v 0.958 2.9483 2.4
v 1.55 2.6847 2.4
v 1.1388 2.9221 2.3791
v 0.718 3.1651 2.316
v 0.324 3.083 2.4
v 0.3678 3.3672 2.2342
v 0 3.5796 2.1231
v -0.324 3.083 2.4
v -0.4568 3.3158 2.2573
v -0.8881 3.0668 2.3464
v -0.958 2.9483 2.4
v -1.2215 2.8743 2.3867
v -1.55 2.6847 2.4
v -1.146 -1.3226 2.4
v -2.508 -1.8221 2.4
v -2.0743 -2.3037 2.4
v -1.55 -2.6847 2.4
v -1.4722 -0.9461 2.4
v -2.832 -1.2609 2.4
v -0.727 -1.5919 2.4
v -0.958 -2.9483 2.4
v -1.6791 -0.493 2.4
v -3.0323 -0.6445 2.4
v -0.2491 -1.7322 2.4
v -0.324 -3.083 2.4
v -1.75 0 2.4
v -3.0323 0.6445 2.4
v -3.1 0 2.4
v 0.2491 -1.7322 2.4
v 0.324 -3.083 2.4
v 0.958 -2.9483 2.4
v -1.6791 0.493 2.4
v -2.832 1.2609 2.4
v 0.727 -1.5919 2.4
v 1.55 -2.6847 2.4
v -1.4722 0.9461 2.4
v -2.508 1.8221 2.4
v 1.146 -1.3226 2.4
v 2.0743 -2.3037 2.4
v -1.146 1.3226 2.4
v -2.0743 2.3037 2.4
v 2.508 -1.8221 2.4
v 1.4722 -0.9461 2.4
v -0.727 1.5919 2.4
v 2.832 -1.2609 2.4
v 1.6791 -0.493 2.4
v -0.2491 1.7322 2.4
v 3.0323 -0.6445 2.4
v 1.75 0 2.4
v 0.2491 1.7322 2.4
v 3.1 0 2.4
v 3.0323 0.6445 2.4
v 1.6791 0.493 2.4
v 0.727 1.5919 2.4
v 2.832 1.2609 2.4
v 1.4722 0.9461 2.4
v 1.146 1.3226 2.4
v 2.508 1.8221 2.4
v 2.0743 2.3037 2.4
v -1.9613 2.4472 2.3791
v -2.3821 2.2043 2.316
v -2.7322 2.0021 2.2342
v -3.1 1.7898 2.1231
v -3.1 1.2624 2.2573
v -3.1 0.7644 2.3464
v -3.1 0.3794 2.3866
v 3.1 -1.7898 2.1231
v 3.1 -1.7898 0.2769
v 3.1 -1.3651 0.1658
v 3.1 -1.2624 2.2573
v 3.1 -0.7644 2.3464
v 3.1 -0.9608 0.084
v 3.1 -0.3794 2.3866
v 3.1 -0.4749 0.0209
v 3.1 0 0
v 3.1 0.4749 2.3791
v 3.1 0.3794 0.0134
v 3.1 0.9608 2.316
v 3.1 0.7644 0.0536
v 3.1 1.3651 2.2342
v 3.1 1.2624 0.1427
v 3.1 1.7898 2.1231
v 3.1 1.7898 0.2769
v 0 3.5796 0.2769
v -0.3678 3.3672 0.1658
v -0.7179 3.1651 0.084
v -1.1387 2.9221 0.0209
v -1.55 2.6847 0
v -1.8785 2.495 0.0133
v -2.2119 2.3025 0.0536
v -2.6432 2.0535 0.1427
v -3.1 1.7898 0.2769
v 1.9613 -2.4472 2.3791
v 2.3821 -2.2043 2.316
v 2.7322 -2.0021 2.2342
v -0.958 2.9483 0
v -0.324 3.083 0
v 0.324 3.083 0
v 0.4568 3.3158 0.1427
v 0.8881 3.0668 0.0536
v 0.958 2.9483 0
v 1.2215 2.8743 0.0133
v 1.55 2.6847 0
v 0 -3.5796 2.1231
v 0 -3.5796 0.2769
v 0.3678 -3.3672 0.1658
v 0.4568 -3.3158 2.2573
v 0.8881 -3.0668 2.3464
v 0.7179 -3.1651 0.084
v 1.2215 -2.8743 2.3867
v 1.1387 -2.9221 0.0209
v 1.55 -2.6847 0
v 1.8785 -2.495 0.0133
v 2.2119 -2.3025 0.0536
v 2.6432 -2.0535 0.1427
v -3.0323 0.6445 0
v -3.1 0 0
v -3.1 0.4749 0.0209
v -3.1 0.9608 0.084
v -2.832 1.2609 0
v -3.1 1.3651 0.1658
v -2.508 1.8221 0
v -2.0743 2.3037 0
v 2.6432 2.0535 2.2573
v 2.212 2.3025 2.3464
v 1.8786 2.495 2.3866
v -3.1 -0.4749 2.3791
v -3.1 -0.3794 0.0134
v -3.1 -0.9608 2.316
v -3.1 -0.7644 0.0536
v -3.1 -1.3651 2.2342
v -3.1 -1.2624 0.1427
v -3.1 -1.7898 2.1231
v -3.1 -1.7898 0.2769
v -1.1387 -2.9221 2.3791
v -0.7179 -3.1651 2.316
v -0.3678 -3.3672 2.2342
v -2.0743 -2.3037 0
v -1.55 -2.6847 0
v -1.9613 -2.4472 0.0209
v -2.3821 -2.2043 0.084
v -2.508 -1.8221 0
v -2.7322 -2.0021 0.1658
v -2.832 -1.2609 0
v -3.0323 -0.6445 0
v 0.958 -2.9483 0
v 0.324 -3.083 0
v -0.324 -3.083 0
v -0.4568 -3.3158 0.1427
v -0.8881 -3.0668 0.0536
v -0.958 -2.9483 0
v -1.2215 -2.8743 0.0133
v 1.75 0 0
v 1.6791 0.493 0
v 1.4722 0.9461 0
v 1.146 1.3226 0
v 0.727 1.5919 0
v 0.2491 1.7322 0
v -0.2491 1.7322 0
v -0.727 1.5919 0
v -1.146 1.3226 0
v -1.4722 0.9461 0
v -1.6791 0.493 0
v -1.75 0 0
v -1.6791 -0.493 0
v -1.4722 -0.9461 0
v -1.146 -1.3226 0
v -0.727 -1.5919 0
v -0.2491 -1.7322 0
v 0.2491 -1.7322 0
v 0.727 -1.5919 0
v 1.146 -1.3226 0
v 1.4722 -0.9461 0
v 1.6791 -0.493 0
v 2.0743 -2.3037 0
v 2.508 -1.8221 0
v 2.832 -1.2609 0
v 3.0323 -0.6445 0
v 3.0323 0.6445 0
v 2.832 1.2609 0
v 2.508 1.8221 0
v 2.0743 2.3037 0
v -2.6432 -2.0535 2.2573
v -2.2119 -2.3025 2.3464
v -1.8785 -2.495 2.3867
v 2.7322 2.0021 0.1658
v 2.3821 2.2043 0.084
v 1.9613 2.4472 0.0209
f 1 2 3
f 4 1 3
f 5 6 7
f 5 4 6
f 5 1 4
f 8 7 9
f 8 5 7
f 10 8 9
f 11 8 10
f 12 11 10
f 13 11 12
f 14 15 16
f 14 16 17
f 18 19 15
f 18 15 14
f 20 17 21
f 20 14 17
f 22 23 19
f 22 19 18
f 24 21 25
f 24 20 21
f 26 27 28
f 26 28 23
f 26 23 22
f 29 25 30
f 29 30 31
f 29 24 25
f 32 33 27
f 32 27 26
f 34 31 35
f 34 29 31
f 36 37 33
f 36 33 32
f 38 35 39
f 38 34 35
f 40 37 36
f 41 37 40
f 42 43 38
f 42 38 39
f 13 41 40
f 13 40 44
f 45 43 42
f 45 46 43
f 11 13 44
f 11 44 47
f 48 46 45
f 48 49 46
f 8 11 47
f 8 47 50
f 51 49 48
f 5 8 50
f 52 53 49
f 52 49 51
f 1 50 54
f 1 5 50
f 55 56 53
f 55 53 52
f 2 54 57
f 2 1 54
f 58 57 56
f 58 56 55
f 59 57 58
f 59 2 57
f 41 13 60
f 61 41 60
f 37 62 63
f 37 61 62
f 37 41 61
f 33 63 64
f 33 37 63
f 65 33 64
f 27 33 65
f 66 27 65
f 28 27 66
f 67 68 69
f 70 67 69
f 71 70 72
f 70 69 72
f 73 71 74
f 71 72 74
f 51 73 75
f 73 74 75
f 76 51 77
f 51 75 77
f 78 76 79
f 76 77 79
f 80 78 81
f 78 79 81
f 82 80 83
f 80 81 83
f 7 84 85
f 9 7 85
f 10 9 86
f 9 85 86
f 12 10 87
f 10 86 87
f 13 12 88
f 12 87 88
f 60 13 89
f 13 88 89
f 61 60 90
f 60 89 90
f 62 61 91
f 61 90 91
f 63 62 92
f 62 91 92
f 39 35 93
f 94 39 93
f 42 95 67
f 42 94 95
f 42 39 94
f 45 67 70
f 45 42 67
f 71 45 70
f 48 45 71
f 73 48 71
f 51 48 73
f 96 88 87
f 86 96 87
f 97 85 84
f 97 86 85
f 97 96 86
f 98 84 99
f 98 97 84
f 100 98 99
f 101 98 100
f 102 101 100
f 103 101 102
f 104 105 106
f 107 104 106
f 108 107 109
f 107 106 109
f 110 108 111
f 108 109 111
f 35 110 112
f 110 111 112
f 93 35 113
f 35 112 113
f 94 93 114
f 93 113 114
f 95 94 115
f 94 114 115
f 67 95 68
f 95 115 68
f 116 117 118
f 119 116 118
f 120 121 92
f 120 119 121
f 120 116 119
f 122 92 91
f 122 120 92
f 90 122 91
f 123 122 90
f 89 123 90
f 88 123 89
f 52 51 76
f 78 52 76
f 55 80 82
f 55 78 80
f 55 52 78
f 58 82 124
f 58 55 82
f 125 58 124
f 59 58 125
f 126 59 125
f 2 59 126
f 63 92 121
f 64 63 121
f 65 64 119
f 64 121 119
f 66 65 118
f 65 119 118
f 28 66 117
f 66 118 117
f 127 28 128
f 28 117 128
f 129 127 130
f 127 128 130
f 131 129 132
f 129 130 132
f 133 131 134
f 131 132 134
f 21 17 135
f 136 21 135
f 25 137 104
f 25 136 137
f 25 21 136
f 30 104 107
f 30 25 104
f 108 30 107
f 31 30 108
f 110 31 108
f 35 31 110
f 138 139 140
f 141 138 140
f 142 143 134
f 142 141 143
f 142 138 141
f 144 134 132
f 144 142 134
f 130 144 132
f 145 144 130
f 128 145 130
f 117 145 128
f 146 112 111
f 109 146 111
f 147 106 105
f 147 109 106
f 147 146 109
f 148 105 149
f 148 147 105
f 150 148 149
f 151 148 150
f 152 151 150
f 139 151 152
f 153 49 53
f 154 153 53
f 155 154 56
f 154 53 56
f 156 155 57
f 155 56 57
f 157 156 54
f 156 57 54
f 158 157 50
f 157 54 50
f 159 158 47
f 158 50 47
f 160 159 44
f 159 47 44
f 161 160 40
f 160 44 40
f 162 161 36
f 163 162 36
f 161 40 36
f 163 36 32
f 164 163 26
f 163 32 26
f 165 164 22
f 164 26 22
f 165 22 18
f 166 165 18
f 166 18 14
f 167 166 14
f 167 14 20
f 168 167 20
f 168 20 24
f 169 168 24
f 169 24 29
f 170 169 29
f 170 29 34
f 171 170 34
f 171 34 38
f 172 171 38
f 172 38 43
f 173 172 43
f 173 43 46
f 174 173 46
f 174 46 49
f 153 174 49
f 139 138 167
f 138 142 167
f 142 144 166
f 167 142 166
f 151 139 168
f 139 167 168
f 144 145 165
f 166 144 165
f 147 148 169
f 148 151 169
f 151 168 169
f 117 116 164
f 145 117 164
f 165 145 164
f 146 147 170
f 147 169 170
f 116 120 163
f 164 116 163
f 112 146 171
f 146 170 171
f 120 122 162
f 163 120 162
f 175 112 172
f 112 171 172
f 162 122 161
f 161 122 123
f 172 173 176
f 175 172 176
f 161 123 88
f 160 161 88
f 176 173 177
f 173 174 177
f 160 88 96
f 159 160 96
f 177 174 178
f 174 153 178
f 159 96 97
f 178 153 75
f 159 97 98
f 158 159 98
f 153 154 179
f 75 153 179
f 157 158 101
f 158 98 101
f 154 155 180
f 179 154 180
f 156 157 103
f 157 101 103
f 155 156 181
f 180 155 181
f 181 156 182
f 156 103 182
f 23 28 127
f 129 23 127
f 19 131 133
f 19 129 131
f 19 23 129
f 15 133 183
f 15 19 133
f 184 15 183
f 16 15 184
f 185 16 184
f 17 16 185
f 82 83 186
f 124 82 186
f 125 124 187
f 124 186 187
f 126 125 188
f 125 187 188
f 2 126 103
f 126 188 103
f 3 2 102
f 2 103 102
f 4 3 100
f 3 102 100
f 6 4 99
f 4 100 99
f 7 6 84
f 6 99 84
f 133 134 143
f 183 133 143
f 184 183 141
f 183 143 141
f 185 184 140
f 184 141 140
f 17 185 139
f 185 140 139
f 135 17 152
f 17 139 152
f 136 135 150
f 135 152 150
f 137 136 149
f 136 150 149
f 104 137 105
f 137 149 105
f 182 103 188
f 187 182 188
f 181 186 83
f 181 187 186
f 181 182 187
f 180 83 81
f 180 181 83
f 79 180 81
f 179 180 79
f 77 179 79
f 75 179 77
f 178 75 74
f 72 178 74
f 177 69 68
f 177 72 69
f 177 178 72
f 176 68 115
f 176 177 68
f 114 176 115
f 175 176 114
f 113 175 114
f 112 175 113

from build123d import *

# Parameters (mm, degrees)
EXTRUDE_1_DEPTH          = 2.4
SKETCH_2_OUTSIDE_W       = 15.35
SKETCH_2_OUTSIDE_H       = 16.31
SKETCH_2_OUTSIDE_R       = 3.1
CUT_EXTRUDE_2_DEPTH      = 1.5
CUT_EXTRUDE_2_DRAFT      = -60
MIRROR_1_COPY_1_SKETCH_W = 15.35
MIRROR_1_COPY_1_SKETCH_H = 16.31
MIRROR_1_COPY_1_SKETCH_R = 3.1
MIRROR_1_COPY_1_DEPTH    = 1.5
MIRROR_1_COPY_1_DRAFT    = -60
SKETCH_3_R               = 1.75
CUT_EXTRUDE_3_DEPTH      = 6.30879773


with BuildPart() as part:
    # 草圖1 → 伸長1 (new body)
    with BuildSketch(Plane.XY):
        Polygon((0, 3.579571669), (-3.1, 1.789785834), (-3.1, -1.789785834), (0, -3.579571669), (3.1, -1.789785834), (3.1, 1.789785834), align=None)
    extrude(amount=EXTRUDE_1_DEPTH)


with BuildPart() as cut_extrude_2_tool:
    # 草圖2 outside → 伸長2 (with draft: the straight prism first)
    with BuildSketch(Plane.XY.offset(2.4)):
        Rectangle(SKETCH_2_OUTSIDE_W, SKETCH_2_OUTSIDE_H)
        Circle(SKETCH_2_OUTSIDE_R, mode=Mode.SUBTRACT)
    extrude(amount=-CUT_EXTRUDE_2_DEPTH)
    # 伸長2: the draft: its side faces are tilted about the plane it starts from
    cut_extrude_2_sides = [cut_extrude_2_tool.faces().sort_by_distance(p)[0] for p in [
        (0, -8.155, 1.65),
        (7.675, 0, 1.65),
        (0, 8.155, 1.65),
        (-7.675, 0, 1.65),
        (-3.1, 0, 1.65),
    ]]
    draft(cut_extrude_2_sides, Plane.XY.offset(2.4), CUT_EXTRUDE_2_DRAFT)


with BuildPart() as part_1:
    add(part.part)

    # 伸長2: cut by cut_extrude_2_tool
    add(cut_extrude_2_tool.part, mode=Mode.SUBTRACT)


with BuildPart() as mirror_1_copy_1_tool:
    # 鏡射1 copy 1 sketch → 鏡射1 copy 1 (with draft: the straight prism first)
    with BuildSketch(Plane(origin=(0, 0, 0), x_dir=(1, 0, 0), z_dir=(0, 0, -1))):
        Rectangle(MIRROR_1_COPY_1_SKETCH_W, MIRROR_1_COPY_1_SKETCH_H)
        Circle(MIRROR_1_COPY_1_SKETCH_R, mode=Mode.SUBTRACT)
    extrude(amount=-MIRROR_1_COPY_1_DEPTH)
    # 鏡射1 copy 1: the draft: its side faces are tilted about the plane it starts from
    mirror_1_copy_1_sides = [mirror_1_copy_1_tool.faces().sort_by_distance(p)[0] for p in [
        (0, -8.155, 0.75),
        (7.675, 0, 0.75),
        (0, 8.155, 0.75),
        (-7.675, 0, 0.75),
        (-3.1, 0, 0.75),
    ]]
    draft(mirror_1_copy_1_sides, Plane(origin=(0, 0, 0), x_dir=(1, 0, 0), z_dir=(0, 0, -1)), MIRROR_1_COPY_1_DRAFT)


with BuildPart() as part_2:
    add(part_1.part)

    # 鏡射1 copy 1: cut by mirror_1_copy_1_tool
    add(mirror_1_copy_1_tool.part, mode=Mode.SUBTRACT)

    # 草圖3 → 伸長3 (cut, through all)
    with BuildSketch(Plane.XY.offset(2.4)):
        Circle(SKETCH_3_R)
    extrude(amount=-CUT_EXTRUDE_3_DEPTH, mode=Mode.SUBTRACT)


solid = part_2.part
